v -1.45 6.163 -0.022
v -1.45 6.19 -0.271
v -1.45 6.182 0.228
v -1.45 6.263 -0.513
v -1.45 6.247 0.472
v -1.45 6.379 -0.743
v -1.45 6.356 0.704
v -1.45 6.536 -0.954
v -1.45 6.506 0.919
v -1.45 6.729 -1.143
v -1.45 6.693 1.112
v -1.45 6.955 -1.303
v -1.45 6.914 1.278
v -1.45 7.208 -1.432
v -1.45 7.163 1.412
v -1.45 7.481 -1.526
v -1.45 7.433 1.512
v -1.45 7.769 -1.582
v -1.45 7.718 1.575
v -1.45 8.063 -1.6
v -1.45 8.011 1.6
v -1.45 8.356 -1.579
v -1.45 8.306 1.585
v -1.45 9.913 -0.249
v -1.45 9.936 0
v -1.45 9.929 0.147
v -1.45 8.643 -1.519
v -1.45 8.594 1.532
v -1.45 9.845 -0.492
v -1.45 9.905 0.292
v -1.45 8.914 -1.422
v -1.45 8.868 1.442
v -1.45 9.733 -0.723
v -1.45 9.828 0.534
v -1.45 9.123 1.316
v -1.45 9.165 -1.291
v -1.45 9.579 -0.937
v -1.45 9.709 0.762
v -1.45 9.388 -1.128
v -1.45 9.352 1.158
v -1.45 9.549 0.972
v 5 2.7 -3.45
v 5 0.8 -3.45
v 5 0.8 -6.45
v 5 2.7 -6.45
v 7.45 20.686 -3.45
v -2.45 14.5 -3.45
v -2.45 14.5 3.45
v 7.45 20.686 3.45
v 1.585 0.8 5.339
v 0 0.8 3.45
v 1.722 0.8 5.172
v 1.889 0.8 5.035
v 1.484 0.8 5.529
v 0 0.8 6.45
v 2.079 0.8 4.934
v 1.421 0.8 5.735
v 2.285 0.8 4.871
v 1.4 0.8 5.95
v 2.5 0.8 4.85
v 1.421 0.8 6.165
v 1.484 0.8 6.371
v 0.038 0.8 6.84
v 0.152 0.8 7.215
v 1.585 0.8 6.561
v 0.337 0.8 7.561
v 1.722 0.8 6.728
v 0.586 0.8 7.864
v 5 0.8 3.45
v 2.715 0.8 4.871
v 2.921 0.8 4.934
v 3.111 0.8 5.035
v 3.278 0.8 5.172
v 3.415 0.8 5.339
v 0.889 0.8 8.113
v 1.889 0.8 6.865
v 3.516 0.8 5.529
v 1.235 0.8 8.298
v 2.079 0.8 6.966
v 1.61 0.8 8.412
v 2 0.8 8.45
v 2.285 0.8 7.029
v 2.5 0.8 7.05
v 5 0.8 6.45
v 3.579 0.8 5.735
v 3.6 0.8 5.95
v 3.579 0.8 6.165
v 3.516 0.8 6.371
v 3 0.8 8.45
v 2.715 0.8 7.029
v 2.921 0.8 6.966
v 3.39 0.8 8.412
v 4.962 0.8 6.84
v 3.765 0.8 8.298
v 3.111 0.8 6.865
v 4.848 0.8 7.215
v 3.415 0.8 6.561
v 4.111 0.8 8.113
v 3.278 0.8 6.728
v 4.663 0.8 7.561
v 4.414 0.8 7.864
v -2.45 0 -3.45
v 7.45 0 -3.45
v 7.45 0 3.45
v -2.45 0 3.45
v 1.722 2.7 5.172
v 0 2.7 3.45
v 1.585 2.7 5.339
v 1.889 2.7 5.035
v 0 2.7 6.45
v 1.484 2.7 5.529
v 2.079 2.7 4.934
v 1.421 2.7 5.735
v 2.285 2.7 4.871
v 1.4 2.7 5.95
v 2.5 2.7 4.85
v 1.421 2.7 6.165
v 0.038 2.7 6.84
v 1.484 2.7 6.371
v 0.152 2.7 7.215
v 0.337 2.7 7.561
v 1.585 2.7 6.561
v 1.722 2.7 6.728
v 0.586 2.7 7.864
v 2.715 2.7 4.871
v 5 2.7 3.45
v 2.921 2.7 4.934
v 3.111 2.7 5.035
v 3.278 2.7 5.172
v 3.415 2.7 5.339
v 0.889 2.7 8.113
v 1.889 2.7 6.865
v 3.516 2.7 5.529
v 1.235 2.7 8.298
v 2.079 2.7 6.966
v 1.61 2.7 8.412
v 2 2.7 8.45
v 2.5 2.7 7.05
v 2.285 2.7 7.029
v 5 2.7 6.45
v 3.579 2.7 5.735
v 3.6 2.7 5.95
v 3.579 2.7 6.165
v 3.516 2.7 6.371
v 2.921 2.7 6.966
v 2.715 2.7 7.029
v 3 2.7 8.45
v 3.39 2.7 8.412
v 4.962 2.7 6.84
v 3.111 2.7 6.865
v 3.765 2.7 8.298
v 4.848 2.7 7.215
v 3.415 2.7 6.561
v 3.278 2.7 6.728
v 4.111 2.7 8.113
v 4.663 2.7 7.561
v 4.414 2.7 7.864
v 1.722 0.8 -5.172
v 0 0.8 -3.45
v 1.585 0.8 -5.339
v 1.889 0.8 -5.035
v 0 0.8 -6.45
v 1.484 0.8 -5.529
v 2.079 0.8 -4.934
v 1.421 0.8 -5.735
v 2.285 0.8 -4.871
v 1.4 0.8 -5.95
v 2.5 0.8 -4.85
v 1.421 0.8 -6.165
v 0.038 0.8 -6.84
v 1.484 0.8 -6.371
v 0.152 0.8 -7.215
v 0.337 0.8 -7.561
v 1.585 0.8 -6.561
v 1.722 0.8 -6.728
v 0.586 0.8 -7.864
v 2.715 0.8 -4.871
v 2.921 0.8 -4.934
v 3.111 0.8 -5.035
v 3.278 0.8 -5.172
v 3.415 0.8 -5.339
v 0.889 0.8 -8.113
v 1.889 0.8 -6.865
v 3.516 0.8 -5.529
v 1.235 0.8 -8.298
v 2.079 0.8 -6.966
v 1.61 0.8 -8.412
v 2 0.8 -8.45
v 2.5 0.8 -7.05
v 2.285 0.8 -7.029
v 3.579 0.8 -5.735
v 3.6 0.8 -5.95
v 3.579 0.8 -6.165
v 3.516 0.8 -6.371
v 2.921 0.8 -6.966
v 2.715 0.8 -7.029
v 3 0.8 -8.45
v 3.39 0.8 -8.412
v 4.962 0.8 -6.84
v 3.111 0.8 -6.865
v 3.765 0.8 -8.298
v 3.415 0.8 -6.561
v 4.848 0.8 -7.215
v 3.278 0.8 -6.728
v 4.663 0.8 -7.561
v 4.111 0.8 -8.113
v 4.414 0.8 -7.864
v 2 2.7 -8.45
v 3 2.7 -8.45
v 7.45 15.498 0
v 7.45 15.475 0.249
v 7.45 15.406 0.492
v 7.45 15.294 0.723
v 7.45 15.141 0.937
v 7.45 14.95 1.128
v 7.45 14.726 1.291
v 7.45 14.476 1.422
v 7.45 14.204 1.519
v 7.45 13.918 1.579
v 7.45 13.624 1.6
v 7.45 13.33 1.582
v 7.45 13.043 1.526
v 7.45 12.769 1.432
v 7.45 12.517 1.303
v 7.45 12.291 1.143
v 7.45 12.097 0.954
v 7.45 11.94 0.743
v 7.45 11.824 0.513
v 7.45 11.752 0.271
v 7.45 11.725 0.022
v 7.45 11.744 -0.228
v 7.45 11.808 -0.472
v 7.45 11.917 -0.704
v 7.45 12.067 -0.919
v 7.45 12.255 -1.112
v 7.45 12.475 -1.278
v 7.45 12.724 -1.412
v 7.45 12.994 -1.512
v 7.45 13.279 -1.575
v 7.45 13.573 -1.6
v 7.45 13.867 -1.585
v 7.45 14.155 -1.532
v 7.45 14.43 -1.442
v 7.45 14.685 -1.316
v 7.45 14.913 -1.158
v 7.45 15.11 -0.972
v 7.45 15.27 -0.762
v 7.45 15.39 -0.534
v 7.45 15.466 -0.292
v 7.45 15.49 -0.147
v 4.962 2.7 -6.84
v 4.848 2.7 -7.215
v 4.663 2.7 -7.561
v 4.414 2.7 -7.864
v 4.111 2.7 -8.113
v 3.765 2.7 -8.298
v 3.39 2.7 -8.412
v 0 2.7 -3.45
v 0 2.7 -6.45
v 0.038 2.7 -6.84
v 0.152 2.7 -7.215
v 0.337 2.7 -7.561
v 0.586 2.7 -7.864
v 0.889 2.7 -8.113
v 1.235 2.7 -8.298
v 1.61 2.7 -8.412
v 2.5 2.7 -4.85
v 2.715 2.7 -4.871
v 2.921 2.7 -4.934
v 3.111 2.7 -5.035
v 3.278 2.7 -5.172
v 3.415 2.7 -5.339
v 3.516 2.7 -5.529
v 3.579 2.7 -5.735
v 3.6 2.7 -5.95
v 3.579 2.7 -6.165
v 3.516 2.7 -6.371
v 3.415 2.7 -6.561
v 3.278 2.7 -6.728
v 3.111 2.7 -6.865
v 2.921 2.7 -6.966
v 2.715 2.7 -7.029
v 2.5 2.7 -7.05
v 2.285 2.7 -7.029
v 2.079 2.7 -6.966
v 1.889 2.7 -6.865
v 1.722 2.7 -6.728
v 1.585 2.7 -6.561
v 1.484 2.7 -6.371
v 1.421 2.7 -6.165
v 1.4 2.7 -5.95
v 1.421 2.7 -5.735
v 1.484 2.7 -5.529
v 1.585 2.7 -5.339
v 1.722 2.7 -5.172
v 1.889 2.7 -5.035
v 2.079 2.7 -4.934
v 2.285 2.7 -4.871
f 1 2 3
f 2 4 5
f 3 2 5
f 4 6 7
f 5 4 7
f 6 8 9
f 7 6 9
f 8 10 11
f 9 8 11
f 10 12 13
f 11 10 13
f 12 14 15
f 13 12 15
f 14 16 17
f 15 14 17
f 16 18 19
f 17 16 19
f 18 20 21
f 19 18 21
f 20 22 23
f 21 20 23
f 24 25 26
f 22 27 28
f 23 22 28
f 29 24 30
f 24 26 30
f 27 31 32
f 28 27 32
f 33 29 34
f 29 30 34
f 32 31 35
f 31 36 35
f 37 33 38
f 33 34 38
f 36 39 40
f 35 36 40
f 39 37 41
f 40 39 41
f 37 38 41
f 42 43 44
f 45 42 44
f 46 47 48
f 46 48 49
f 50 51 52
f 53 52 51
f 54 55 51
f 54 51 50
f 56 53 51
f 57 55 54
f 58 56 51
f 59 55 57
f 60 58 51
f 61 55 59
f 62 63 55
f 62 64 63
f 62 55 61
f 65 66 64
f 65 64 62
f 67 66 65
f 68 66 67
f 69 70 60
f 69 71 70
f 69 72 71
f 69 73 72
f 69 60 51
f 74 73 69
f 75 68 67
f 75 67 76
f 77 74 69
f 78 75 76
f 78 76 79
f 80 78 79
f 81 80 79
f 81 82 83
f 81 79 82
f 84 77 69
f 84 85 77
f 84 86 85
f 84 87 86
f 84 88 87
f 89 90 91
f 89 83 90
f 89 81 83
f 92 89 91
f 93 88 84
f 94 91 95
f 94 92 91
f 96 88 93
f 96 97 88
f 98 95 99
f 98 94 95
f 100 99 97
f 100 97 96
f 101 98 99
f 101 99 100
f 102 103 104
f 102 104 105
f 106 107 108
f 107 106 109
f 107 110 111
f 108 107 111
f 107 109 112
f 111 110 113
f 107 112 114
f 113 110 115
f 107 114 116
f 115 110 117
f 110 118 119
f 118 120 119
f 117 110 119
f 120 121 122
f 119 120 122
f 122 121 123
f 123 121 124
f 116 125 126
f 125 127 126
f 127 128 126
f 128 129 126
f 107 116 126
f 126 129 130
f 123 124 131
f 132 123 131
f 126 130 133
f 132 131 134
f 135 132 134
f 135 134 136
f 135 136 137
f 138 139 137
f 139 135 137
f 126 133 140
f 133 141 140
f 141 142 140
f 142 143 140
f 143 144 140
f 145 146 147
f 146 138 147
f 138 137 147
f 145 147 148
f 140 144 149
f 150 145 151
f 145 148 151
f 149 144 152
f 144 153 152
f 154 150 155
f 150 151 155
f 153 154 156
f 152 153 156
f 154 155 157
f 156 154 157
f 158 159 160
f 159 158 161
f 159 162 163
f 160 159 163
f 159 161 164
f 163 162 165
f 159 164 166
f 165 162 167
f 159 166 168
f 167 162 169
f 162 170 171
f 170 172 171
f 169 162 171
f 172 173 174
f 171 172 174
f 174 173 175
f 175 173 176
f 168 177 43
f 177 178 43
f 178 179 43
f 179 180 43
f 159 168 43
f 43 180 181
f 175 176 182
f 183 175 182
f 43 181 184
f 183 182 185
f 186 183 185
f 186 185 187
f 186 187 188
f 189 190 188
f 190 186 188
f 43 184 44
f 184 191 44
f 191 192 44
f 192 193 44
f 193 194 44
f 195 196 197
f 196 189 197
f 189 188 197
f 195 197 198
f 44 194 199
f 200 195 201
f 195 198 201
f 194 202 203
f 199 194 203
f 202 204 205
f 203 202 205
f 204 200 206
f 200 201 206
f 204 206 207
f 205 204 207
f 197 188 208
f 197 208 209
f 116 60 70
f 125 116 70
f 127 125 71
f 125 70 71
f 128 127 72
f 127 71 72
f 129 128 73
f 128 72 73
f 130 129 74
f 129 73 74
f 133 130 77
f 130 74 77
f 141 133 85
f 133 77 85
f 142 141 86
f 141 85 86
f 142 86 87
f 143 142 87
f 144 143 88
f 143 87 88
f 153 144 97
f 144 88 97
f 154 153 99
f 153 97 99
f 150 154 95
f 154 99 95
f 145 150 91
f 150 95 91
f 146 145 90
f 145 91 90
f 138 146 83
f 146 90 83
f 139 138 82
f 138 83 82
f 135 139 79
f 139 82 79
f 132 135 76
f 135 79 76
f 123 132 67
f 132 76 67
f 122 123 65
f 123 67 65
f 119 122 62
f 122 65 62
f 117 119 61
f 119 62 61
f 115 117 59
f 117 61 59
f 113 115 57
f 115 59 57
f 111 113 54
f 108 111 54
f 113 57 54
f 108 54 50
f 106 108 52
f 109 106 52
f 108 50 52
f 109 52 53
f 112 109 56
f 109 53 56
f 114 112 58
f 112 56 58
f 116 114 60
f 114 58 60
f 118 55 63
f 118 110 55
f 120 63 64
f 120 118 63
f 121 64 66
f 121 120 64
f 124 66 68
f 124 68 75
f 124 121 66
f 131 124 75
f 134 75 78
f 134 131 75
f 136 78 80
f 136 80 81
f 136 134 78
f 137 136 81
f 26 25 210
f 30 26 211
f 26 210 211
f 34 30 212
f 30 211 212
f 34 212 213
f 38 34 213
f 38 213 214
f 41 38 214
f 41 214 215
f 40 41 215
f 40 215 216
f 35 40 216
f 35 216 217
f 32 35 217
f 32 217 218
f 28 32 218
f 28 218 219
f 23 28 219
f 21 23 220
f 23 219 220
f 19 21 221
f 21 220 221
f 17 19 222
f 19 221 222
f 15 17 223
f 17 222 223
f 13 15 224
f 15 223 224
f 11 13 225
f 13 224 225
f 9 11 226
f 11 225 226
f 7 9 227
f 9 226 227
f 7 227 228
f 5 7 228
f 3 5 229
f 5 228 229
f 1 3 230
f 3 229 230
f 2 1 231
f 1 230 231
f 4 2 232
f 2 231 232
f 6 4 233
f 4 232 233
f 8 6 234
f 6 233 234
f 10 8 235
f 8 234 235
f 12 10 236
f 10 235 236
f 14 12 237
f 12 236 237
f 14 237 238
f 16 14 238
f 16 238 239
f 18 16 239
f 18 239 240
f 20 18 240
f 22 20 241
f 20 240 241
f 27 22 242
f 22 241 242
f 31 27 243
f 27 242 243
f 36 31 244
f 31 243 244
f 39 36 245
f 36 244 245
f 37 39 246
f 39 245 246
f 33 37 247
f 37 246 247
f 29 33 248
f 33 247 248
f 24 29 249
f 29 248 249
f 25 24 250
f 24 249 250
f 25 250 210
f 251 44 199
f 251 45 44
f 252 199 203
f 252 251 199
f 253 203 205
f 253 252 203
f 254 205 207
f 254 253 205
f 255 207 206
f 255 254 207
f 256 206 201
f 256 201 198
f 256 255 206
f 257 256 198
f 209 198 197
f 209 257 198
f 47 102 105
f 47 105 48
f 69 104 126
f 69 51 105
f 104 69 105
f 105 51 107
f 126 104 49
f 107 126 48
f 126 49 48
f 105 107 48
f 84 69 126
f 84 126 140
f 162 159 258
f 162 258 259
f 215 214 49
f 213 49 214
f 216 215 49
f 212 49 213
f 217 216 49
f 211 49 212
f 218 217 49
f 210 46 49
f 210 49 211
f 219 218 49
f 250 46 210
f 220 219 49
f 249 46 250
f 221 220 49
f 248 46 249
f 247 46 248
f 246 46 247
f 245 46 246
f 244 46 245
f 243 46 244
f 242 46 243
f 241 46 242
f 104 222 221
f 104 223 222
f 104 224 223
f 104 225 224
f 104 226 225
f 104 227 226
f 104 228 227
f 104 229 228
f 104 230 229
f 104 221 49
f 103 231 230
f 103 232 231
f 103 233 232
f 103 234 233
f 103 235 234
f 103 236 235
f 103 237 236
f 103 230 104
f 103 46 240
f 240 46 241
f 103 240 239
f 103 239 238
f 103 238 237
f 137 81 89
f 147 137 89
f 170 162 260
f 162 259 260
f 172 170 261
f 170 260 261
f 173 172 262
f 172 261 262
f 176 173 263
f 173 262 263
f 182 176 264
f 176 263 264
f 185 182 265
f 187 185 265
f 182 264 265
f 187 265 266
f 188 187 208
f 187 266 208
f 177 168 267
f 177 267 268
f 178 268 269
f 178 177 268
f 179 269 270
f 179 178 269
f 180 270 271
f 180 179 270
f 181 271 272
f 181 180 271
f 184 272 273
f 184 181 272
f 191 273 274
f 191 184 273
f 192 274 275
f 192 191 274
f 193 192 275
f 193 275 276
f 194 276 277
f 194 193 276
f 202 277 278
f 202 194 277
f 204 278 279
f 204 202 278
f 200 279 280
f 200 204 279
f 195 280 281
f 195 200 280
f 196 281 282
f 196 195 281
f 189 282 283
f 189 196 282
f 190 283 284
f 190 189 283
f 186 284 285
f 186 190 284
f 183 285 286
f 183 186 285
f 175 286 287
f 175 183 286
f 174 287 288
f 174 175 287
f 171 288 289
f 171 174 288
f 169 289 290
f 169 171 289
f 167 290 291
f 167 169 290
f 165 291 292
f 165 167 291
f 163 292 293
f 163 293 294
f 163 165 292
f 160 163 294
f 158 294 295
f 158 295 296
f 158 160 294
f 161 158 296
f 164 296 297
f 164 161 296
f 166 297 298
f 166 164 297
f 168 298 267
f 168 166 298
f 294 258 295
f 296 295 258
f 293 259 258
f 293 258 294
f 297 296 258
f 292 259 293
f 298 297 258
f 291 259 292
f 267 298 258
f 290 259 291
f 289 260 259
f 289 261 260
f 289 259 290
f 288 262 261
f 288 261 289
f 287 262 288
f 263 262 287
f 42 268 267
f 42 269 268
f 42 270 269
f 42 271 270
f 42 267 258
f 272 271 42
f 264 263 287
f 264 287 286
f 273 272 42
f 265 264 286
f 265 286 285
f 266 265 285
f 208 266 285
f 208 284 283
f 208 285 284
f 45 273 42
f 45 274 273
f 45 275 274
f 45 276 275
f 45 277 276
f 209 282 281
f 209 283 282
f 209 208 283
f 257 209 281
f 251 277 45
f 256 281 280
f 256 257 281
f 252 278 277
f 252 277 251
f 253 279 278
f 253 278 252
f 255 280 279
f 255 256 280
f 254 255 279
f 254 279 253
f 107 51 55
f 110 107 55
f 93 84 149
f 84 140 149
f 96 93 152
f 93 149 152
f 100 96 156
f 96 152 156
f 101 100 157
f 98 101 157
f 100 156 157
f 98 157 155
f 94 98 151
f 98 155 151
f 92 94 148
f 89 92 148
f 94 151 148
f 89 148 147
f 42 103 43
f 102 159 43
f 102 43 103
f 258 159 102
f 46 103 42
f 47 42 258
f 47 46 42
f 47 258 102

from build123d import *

# Parameters (mm, degrees)
EXTRUDE_1_DEPTH        = 1.5
SKETCH_3_R             = 1.1
CUT_EXTRUDE_1_DEPTH    = 5
EXTRUDE_2_DEPTH        = 6.9
SWEEP_1_PROFILE_R      = 1.6
CUT_EXTRUDE_START      = -7.8
CUT_EXTRUDE_5_DEPTH    = 7.8
EXTRUDE_START          = -0.8
SKETCH_81_W            = 5
SKETCH_81_H            = 5
SKETCH_81_R            = 1.1
EXTRUDE_8_DEPTH        = 1.9
FILLET_1_R             = 2
FILLET_1_OF_MIRROR_1_R = 2
SKETCH_83_W            = 6.9
SKETCH_83_H            = 14.5
EXTRUDE_10_DEPTH       = 1


with BuildPart() as part:
    # 草图2 → 凸台-拉伸1 (new body)
    with BuildSketch(Plane(origin=(0, 0, 0), x_dir=(1, 0, 0), z_dir=(0, 1, 0))):
        with BuildLine():
            Line((-4.95, 3.45), (7.45, 3.45))
            Line((7.45, 3.45), (7.45, -3.45))
            Line((7.45, -3.45), (-4.95, -3.45))
            ThreePointArc((-4.95, -3.45), (-6.717766953, -2.717766953), (-7.45, -0.95))
            Line((-7.45, -0.95), (-7.45, 0.95))
            ThreePointArc((-7.45, 0.95), (-6.717766953, 2.717766953), (-4.95, 3.45))
        make_face()
    extrude(amount=EXTRUDE_1_DEPTH)

    # 草图3 → 切除-拉伸1 (cut)
    with BuildSketch(Plane(origin=(0, 1.5, 0), x_dir=(1, 0, 0), z_dir=(0, 1, 0))):
        with Locations(Location((-4.95, 0, 0), (0, 0, 270))):
            Circle(SKETCH_3_R)
    extrude(amount=-CUT_EXTRUDE_1_DEPTH, mode=Mode.SUBTRACT)

    # 草图5 → 凸台-拉伸2 (add)
    with BuildSketch(Plane(origin=(0, 0, -3.45), x_dir=(-1, 0, 0), z_dir=(0, 0, -1))):
        Polygon((2.45, 1.5), (2.45, 14.5), (-7.45, 20.686206584), (-7.45, 1.5), align=None)
    extrude(amount=-EXTRUDE_2_DEPTH)

    # 切除-扫描1: sweep along a path in 草图7
    with BuildLine(Plane.XY) as sweep_1_path:
        Line((-6.203786906, 5.079303189), (11.626887116, 16.221144909))
    # 切除-扫描1 profile (on start of the path) → 切除-扫描1 (sweep, cut)
    with BuildSketch(Plane(origin=(-6.203786906, 5.079303189, 0), x_dir=(-0.529919264233206, 0.8480480961564254, 0), z_dir=(0.8480480961564254, 0.529919264233206, 0))):
        Circle(SWEEP_1_PROFILE_R)
    sweep(path=sweep_1_path.line, mode=Mode.SUBTRACT)

    # 草图80 → 切除-拉伸5 (cut)
    with BuildSketch(Plane(origin=(0, 1.5, 0), x_dir=(1, 0, 0), z_dir=(0, 1, 0)).offset(CUT_EXTRUDE_START)):
        with BuildLine():
            Line((-4.95, -3.45), (-2.45, -3.45))
            Line((-2.45, -3.45), (-2.45, 3.45))
            Line((-2.45, 3.45), (-4.95, 3.45))
            ThreePointArc((-4.95, 3.45), (-6.717766953, 2.717766953), (-7.45, 0.95))
            Line((-7.45, 0.95), (-7.45, -0.95))
            ThreePointArc((-7.45, -0.95), (-6.717766953, -2.717766953), (-4.95, -3.45))
        make_face()
    extrude(amount=CUT_EXTRUDE_5_DEPTH, mode=Mode.SUBTRACT)

    # 草图81 → 凸台-拉伸8 (add)
    with BuildSketch(Plane.XZ.offset(EXTRUDE_START)):
        with Locations((2.5, 5.95)):
            Rectangle(SKETCH_81_W, SKETCH_81_H)
        with Locations(Location((2.5, 5.95, 0), (0, 0, 270))):
            Circle(SKETCH_81_R, mode=Mode.SUBTRACT)
    extrude_8 = extrude(amount=-EXTRUDE_8_DEPTH)

    # 圆角1
    fillet_1_edges = [part.edges().sort_by_distance(p)[0] for p in [
        (5, 1.75, 8.45),
        (0, 1.75, 8.45),
    ]]
    fillet(fillet_1_edges, radius=FILLET_1_R)

    # 镜向1: 凸台-拉伸8 across plane
    add(extrude_8.mirror(Plane.XY))

    # 圆角1 of 镜向1
    fillet_1_of_mirror_1_edges = [part.edges().sort_by_distance(p)[0] for p in [
        (5, 1.75, -8.45),
        (0, 1.75, -8.45),
    ]]
    fillet(fillet_1_of_mirror_1_edges, radius=FILLET_1_OF_MIRROR_1_R)

    # 草图83 → 凸台-拉伸10 (add)
    with BuildSketch(Plane.ZY.offset(2.45)):
        with Locations((0, 7.25)):
            Rectangle(SKETCH_83_W, SKETCH_83_H)
    extrude(amount=-EXTRUDE_10_DEPTH)


solid = part.part
